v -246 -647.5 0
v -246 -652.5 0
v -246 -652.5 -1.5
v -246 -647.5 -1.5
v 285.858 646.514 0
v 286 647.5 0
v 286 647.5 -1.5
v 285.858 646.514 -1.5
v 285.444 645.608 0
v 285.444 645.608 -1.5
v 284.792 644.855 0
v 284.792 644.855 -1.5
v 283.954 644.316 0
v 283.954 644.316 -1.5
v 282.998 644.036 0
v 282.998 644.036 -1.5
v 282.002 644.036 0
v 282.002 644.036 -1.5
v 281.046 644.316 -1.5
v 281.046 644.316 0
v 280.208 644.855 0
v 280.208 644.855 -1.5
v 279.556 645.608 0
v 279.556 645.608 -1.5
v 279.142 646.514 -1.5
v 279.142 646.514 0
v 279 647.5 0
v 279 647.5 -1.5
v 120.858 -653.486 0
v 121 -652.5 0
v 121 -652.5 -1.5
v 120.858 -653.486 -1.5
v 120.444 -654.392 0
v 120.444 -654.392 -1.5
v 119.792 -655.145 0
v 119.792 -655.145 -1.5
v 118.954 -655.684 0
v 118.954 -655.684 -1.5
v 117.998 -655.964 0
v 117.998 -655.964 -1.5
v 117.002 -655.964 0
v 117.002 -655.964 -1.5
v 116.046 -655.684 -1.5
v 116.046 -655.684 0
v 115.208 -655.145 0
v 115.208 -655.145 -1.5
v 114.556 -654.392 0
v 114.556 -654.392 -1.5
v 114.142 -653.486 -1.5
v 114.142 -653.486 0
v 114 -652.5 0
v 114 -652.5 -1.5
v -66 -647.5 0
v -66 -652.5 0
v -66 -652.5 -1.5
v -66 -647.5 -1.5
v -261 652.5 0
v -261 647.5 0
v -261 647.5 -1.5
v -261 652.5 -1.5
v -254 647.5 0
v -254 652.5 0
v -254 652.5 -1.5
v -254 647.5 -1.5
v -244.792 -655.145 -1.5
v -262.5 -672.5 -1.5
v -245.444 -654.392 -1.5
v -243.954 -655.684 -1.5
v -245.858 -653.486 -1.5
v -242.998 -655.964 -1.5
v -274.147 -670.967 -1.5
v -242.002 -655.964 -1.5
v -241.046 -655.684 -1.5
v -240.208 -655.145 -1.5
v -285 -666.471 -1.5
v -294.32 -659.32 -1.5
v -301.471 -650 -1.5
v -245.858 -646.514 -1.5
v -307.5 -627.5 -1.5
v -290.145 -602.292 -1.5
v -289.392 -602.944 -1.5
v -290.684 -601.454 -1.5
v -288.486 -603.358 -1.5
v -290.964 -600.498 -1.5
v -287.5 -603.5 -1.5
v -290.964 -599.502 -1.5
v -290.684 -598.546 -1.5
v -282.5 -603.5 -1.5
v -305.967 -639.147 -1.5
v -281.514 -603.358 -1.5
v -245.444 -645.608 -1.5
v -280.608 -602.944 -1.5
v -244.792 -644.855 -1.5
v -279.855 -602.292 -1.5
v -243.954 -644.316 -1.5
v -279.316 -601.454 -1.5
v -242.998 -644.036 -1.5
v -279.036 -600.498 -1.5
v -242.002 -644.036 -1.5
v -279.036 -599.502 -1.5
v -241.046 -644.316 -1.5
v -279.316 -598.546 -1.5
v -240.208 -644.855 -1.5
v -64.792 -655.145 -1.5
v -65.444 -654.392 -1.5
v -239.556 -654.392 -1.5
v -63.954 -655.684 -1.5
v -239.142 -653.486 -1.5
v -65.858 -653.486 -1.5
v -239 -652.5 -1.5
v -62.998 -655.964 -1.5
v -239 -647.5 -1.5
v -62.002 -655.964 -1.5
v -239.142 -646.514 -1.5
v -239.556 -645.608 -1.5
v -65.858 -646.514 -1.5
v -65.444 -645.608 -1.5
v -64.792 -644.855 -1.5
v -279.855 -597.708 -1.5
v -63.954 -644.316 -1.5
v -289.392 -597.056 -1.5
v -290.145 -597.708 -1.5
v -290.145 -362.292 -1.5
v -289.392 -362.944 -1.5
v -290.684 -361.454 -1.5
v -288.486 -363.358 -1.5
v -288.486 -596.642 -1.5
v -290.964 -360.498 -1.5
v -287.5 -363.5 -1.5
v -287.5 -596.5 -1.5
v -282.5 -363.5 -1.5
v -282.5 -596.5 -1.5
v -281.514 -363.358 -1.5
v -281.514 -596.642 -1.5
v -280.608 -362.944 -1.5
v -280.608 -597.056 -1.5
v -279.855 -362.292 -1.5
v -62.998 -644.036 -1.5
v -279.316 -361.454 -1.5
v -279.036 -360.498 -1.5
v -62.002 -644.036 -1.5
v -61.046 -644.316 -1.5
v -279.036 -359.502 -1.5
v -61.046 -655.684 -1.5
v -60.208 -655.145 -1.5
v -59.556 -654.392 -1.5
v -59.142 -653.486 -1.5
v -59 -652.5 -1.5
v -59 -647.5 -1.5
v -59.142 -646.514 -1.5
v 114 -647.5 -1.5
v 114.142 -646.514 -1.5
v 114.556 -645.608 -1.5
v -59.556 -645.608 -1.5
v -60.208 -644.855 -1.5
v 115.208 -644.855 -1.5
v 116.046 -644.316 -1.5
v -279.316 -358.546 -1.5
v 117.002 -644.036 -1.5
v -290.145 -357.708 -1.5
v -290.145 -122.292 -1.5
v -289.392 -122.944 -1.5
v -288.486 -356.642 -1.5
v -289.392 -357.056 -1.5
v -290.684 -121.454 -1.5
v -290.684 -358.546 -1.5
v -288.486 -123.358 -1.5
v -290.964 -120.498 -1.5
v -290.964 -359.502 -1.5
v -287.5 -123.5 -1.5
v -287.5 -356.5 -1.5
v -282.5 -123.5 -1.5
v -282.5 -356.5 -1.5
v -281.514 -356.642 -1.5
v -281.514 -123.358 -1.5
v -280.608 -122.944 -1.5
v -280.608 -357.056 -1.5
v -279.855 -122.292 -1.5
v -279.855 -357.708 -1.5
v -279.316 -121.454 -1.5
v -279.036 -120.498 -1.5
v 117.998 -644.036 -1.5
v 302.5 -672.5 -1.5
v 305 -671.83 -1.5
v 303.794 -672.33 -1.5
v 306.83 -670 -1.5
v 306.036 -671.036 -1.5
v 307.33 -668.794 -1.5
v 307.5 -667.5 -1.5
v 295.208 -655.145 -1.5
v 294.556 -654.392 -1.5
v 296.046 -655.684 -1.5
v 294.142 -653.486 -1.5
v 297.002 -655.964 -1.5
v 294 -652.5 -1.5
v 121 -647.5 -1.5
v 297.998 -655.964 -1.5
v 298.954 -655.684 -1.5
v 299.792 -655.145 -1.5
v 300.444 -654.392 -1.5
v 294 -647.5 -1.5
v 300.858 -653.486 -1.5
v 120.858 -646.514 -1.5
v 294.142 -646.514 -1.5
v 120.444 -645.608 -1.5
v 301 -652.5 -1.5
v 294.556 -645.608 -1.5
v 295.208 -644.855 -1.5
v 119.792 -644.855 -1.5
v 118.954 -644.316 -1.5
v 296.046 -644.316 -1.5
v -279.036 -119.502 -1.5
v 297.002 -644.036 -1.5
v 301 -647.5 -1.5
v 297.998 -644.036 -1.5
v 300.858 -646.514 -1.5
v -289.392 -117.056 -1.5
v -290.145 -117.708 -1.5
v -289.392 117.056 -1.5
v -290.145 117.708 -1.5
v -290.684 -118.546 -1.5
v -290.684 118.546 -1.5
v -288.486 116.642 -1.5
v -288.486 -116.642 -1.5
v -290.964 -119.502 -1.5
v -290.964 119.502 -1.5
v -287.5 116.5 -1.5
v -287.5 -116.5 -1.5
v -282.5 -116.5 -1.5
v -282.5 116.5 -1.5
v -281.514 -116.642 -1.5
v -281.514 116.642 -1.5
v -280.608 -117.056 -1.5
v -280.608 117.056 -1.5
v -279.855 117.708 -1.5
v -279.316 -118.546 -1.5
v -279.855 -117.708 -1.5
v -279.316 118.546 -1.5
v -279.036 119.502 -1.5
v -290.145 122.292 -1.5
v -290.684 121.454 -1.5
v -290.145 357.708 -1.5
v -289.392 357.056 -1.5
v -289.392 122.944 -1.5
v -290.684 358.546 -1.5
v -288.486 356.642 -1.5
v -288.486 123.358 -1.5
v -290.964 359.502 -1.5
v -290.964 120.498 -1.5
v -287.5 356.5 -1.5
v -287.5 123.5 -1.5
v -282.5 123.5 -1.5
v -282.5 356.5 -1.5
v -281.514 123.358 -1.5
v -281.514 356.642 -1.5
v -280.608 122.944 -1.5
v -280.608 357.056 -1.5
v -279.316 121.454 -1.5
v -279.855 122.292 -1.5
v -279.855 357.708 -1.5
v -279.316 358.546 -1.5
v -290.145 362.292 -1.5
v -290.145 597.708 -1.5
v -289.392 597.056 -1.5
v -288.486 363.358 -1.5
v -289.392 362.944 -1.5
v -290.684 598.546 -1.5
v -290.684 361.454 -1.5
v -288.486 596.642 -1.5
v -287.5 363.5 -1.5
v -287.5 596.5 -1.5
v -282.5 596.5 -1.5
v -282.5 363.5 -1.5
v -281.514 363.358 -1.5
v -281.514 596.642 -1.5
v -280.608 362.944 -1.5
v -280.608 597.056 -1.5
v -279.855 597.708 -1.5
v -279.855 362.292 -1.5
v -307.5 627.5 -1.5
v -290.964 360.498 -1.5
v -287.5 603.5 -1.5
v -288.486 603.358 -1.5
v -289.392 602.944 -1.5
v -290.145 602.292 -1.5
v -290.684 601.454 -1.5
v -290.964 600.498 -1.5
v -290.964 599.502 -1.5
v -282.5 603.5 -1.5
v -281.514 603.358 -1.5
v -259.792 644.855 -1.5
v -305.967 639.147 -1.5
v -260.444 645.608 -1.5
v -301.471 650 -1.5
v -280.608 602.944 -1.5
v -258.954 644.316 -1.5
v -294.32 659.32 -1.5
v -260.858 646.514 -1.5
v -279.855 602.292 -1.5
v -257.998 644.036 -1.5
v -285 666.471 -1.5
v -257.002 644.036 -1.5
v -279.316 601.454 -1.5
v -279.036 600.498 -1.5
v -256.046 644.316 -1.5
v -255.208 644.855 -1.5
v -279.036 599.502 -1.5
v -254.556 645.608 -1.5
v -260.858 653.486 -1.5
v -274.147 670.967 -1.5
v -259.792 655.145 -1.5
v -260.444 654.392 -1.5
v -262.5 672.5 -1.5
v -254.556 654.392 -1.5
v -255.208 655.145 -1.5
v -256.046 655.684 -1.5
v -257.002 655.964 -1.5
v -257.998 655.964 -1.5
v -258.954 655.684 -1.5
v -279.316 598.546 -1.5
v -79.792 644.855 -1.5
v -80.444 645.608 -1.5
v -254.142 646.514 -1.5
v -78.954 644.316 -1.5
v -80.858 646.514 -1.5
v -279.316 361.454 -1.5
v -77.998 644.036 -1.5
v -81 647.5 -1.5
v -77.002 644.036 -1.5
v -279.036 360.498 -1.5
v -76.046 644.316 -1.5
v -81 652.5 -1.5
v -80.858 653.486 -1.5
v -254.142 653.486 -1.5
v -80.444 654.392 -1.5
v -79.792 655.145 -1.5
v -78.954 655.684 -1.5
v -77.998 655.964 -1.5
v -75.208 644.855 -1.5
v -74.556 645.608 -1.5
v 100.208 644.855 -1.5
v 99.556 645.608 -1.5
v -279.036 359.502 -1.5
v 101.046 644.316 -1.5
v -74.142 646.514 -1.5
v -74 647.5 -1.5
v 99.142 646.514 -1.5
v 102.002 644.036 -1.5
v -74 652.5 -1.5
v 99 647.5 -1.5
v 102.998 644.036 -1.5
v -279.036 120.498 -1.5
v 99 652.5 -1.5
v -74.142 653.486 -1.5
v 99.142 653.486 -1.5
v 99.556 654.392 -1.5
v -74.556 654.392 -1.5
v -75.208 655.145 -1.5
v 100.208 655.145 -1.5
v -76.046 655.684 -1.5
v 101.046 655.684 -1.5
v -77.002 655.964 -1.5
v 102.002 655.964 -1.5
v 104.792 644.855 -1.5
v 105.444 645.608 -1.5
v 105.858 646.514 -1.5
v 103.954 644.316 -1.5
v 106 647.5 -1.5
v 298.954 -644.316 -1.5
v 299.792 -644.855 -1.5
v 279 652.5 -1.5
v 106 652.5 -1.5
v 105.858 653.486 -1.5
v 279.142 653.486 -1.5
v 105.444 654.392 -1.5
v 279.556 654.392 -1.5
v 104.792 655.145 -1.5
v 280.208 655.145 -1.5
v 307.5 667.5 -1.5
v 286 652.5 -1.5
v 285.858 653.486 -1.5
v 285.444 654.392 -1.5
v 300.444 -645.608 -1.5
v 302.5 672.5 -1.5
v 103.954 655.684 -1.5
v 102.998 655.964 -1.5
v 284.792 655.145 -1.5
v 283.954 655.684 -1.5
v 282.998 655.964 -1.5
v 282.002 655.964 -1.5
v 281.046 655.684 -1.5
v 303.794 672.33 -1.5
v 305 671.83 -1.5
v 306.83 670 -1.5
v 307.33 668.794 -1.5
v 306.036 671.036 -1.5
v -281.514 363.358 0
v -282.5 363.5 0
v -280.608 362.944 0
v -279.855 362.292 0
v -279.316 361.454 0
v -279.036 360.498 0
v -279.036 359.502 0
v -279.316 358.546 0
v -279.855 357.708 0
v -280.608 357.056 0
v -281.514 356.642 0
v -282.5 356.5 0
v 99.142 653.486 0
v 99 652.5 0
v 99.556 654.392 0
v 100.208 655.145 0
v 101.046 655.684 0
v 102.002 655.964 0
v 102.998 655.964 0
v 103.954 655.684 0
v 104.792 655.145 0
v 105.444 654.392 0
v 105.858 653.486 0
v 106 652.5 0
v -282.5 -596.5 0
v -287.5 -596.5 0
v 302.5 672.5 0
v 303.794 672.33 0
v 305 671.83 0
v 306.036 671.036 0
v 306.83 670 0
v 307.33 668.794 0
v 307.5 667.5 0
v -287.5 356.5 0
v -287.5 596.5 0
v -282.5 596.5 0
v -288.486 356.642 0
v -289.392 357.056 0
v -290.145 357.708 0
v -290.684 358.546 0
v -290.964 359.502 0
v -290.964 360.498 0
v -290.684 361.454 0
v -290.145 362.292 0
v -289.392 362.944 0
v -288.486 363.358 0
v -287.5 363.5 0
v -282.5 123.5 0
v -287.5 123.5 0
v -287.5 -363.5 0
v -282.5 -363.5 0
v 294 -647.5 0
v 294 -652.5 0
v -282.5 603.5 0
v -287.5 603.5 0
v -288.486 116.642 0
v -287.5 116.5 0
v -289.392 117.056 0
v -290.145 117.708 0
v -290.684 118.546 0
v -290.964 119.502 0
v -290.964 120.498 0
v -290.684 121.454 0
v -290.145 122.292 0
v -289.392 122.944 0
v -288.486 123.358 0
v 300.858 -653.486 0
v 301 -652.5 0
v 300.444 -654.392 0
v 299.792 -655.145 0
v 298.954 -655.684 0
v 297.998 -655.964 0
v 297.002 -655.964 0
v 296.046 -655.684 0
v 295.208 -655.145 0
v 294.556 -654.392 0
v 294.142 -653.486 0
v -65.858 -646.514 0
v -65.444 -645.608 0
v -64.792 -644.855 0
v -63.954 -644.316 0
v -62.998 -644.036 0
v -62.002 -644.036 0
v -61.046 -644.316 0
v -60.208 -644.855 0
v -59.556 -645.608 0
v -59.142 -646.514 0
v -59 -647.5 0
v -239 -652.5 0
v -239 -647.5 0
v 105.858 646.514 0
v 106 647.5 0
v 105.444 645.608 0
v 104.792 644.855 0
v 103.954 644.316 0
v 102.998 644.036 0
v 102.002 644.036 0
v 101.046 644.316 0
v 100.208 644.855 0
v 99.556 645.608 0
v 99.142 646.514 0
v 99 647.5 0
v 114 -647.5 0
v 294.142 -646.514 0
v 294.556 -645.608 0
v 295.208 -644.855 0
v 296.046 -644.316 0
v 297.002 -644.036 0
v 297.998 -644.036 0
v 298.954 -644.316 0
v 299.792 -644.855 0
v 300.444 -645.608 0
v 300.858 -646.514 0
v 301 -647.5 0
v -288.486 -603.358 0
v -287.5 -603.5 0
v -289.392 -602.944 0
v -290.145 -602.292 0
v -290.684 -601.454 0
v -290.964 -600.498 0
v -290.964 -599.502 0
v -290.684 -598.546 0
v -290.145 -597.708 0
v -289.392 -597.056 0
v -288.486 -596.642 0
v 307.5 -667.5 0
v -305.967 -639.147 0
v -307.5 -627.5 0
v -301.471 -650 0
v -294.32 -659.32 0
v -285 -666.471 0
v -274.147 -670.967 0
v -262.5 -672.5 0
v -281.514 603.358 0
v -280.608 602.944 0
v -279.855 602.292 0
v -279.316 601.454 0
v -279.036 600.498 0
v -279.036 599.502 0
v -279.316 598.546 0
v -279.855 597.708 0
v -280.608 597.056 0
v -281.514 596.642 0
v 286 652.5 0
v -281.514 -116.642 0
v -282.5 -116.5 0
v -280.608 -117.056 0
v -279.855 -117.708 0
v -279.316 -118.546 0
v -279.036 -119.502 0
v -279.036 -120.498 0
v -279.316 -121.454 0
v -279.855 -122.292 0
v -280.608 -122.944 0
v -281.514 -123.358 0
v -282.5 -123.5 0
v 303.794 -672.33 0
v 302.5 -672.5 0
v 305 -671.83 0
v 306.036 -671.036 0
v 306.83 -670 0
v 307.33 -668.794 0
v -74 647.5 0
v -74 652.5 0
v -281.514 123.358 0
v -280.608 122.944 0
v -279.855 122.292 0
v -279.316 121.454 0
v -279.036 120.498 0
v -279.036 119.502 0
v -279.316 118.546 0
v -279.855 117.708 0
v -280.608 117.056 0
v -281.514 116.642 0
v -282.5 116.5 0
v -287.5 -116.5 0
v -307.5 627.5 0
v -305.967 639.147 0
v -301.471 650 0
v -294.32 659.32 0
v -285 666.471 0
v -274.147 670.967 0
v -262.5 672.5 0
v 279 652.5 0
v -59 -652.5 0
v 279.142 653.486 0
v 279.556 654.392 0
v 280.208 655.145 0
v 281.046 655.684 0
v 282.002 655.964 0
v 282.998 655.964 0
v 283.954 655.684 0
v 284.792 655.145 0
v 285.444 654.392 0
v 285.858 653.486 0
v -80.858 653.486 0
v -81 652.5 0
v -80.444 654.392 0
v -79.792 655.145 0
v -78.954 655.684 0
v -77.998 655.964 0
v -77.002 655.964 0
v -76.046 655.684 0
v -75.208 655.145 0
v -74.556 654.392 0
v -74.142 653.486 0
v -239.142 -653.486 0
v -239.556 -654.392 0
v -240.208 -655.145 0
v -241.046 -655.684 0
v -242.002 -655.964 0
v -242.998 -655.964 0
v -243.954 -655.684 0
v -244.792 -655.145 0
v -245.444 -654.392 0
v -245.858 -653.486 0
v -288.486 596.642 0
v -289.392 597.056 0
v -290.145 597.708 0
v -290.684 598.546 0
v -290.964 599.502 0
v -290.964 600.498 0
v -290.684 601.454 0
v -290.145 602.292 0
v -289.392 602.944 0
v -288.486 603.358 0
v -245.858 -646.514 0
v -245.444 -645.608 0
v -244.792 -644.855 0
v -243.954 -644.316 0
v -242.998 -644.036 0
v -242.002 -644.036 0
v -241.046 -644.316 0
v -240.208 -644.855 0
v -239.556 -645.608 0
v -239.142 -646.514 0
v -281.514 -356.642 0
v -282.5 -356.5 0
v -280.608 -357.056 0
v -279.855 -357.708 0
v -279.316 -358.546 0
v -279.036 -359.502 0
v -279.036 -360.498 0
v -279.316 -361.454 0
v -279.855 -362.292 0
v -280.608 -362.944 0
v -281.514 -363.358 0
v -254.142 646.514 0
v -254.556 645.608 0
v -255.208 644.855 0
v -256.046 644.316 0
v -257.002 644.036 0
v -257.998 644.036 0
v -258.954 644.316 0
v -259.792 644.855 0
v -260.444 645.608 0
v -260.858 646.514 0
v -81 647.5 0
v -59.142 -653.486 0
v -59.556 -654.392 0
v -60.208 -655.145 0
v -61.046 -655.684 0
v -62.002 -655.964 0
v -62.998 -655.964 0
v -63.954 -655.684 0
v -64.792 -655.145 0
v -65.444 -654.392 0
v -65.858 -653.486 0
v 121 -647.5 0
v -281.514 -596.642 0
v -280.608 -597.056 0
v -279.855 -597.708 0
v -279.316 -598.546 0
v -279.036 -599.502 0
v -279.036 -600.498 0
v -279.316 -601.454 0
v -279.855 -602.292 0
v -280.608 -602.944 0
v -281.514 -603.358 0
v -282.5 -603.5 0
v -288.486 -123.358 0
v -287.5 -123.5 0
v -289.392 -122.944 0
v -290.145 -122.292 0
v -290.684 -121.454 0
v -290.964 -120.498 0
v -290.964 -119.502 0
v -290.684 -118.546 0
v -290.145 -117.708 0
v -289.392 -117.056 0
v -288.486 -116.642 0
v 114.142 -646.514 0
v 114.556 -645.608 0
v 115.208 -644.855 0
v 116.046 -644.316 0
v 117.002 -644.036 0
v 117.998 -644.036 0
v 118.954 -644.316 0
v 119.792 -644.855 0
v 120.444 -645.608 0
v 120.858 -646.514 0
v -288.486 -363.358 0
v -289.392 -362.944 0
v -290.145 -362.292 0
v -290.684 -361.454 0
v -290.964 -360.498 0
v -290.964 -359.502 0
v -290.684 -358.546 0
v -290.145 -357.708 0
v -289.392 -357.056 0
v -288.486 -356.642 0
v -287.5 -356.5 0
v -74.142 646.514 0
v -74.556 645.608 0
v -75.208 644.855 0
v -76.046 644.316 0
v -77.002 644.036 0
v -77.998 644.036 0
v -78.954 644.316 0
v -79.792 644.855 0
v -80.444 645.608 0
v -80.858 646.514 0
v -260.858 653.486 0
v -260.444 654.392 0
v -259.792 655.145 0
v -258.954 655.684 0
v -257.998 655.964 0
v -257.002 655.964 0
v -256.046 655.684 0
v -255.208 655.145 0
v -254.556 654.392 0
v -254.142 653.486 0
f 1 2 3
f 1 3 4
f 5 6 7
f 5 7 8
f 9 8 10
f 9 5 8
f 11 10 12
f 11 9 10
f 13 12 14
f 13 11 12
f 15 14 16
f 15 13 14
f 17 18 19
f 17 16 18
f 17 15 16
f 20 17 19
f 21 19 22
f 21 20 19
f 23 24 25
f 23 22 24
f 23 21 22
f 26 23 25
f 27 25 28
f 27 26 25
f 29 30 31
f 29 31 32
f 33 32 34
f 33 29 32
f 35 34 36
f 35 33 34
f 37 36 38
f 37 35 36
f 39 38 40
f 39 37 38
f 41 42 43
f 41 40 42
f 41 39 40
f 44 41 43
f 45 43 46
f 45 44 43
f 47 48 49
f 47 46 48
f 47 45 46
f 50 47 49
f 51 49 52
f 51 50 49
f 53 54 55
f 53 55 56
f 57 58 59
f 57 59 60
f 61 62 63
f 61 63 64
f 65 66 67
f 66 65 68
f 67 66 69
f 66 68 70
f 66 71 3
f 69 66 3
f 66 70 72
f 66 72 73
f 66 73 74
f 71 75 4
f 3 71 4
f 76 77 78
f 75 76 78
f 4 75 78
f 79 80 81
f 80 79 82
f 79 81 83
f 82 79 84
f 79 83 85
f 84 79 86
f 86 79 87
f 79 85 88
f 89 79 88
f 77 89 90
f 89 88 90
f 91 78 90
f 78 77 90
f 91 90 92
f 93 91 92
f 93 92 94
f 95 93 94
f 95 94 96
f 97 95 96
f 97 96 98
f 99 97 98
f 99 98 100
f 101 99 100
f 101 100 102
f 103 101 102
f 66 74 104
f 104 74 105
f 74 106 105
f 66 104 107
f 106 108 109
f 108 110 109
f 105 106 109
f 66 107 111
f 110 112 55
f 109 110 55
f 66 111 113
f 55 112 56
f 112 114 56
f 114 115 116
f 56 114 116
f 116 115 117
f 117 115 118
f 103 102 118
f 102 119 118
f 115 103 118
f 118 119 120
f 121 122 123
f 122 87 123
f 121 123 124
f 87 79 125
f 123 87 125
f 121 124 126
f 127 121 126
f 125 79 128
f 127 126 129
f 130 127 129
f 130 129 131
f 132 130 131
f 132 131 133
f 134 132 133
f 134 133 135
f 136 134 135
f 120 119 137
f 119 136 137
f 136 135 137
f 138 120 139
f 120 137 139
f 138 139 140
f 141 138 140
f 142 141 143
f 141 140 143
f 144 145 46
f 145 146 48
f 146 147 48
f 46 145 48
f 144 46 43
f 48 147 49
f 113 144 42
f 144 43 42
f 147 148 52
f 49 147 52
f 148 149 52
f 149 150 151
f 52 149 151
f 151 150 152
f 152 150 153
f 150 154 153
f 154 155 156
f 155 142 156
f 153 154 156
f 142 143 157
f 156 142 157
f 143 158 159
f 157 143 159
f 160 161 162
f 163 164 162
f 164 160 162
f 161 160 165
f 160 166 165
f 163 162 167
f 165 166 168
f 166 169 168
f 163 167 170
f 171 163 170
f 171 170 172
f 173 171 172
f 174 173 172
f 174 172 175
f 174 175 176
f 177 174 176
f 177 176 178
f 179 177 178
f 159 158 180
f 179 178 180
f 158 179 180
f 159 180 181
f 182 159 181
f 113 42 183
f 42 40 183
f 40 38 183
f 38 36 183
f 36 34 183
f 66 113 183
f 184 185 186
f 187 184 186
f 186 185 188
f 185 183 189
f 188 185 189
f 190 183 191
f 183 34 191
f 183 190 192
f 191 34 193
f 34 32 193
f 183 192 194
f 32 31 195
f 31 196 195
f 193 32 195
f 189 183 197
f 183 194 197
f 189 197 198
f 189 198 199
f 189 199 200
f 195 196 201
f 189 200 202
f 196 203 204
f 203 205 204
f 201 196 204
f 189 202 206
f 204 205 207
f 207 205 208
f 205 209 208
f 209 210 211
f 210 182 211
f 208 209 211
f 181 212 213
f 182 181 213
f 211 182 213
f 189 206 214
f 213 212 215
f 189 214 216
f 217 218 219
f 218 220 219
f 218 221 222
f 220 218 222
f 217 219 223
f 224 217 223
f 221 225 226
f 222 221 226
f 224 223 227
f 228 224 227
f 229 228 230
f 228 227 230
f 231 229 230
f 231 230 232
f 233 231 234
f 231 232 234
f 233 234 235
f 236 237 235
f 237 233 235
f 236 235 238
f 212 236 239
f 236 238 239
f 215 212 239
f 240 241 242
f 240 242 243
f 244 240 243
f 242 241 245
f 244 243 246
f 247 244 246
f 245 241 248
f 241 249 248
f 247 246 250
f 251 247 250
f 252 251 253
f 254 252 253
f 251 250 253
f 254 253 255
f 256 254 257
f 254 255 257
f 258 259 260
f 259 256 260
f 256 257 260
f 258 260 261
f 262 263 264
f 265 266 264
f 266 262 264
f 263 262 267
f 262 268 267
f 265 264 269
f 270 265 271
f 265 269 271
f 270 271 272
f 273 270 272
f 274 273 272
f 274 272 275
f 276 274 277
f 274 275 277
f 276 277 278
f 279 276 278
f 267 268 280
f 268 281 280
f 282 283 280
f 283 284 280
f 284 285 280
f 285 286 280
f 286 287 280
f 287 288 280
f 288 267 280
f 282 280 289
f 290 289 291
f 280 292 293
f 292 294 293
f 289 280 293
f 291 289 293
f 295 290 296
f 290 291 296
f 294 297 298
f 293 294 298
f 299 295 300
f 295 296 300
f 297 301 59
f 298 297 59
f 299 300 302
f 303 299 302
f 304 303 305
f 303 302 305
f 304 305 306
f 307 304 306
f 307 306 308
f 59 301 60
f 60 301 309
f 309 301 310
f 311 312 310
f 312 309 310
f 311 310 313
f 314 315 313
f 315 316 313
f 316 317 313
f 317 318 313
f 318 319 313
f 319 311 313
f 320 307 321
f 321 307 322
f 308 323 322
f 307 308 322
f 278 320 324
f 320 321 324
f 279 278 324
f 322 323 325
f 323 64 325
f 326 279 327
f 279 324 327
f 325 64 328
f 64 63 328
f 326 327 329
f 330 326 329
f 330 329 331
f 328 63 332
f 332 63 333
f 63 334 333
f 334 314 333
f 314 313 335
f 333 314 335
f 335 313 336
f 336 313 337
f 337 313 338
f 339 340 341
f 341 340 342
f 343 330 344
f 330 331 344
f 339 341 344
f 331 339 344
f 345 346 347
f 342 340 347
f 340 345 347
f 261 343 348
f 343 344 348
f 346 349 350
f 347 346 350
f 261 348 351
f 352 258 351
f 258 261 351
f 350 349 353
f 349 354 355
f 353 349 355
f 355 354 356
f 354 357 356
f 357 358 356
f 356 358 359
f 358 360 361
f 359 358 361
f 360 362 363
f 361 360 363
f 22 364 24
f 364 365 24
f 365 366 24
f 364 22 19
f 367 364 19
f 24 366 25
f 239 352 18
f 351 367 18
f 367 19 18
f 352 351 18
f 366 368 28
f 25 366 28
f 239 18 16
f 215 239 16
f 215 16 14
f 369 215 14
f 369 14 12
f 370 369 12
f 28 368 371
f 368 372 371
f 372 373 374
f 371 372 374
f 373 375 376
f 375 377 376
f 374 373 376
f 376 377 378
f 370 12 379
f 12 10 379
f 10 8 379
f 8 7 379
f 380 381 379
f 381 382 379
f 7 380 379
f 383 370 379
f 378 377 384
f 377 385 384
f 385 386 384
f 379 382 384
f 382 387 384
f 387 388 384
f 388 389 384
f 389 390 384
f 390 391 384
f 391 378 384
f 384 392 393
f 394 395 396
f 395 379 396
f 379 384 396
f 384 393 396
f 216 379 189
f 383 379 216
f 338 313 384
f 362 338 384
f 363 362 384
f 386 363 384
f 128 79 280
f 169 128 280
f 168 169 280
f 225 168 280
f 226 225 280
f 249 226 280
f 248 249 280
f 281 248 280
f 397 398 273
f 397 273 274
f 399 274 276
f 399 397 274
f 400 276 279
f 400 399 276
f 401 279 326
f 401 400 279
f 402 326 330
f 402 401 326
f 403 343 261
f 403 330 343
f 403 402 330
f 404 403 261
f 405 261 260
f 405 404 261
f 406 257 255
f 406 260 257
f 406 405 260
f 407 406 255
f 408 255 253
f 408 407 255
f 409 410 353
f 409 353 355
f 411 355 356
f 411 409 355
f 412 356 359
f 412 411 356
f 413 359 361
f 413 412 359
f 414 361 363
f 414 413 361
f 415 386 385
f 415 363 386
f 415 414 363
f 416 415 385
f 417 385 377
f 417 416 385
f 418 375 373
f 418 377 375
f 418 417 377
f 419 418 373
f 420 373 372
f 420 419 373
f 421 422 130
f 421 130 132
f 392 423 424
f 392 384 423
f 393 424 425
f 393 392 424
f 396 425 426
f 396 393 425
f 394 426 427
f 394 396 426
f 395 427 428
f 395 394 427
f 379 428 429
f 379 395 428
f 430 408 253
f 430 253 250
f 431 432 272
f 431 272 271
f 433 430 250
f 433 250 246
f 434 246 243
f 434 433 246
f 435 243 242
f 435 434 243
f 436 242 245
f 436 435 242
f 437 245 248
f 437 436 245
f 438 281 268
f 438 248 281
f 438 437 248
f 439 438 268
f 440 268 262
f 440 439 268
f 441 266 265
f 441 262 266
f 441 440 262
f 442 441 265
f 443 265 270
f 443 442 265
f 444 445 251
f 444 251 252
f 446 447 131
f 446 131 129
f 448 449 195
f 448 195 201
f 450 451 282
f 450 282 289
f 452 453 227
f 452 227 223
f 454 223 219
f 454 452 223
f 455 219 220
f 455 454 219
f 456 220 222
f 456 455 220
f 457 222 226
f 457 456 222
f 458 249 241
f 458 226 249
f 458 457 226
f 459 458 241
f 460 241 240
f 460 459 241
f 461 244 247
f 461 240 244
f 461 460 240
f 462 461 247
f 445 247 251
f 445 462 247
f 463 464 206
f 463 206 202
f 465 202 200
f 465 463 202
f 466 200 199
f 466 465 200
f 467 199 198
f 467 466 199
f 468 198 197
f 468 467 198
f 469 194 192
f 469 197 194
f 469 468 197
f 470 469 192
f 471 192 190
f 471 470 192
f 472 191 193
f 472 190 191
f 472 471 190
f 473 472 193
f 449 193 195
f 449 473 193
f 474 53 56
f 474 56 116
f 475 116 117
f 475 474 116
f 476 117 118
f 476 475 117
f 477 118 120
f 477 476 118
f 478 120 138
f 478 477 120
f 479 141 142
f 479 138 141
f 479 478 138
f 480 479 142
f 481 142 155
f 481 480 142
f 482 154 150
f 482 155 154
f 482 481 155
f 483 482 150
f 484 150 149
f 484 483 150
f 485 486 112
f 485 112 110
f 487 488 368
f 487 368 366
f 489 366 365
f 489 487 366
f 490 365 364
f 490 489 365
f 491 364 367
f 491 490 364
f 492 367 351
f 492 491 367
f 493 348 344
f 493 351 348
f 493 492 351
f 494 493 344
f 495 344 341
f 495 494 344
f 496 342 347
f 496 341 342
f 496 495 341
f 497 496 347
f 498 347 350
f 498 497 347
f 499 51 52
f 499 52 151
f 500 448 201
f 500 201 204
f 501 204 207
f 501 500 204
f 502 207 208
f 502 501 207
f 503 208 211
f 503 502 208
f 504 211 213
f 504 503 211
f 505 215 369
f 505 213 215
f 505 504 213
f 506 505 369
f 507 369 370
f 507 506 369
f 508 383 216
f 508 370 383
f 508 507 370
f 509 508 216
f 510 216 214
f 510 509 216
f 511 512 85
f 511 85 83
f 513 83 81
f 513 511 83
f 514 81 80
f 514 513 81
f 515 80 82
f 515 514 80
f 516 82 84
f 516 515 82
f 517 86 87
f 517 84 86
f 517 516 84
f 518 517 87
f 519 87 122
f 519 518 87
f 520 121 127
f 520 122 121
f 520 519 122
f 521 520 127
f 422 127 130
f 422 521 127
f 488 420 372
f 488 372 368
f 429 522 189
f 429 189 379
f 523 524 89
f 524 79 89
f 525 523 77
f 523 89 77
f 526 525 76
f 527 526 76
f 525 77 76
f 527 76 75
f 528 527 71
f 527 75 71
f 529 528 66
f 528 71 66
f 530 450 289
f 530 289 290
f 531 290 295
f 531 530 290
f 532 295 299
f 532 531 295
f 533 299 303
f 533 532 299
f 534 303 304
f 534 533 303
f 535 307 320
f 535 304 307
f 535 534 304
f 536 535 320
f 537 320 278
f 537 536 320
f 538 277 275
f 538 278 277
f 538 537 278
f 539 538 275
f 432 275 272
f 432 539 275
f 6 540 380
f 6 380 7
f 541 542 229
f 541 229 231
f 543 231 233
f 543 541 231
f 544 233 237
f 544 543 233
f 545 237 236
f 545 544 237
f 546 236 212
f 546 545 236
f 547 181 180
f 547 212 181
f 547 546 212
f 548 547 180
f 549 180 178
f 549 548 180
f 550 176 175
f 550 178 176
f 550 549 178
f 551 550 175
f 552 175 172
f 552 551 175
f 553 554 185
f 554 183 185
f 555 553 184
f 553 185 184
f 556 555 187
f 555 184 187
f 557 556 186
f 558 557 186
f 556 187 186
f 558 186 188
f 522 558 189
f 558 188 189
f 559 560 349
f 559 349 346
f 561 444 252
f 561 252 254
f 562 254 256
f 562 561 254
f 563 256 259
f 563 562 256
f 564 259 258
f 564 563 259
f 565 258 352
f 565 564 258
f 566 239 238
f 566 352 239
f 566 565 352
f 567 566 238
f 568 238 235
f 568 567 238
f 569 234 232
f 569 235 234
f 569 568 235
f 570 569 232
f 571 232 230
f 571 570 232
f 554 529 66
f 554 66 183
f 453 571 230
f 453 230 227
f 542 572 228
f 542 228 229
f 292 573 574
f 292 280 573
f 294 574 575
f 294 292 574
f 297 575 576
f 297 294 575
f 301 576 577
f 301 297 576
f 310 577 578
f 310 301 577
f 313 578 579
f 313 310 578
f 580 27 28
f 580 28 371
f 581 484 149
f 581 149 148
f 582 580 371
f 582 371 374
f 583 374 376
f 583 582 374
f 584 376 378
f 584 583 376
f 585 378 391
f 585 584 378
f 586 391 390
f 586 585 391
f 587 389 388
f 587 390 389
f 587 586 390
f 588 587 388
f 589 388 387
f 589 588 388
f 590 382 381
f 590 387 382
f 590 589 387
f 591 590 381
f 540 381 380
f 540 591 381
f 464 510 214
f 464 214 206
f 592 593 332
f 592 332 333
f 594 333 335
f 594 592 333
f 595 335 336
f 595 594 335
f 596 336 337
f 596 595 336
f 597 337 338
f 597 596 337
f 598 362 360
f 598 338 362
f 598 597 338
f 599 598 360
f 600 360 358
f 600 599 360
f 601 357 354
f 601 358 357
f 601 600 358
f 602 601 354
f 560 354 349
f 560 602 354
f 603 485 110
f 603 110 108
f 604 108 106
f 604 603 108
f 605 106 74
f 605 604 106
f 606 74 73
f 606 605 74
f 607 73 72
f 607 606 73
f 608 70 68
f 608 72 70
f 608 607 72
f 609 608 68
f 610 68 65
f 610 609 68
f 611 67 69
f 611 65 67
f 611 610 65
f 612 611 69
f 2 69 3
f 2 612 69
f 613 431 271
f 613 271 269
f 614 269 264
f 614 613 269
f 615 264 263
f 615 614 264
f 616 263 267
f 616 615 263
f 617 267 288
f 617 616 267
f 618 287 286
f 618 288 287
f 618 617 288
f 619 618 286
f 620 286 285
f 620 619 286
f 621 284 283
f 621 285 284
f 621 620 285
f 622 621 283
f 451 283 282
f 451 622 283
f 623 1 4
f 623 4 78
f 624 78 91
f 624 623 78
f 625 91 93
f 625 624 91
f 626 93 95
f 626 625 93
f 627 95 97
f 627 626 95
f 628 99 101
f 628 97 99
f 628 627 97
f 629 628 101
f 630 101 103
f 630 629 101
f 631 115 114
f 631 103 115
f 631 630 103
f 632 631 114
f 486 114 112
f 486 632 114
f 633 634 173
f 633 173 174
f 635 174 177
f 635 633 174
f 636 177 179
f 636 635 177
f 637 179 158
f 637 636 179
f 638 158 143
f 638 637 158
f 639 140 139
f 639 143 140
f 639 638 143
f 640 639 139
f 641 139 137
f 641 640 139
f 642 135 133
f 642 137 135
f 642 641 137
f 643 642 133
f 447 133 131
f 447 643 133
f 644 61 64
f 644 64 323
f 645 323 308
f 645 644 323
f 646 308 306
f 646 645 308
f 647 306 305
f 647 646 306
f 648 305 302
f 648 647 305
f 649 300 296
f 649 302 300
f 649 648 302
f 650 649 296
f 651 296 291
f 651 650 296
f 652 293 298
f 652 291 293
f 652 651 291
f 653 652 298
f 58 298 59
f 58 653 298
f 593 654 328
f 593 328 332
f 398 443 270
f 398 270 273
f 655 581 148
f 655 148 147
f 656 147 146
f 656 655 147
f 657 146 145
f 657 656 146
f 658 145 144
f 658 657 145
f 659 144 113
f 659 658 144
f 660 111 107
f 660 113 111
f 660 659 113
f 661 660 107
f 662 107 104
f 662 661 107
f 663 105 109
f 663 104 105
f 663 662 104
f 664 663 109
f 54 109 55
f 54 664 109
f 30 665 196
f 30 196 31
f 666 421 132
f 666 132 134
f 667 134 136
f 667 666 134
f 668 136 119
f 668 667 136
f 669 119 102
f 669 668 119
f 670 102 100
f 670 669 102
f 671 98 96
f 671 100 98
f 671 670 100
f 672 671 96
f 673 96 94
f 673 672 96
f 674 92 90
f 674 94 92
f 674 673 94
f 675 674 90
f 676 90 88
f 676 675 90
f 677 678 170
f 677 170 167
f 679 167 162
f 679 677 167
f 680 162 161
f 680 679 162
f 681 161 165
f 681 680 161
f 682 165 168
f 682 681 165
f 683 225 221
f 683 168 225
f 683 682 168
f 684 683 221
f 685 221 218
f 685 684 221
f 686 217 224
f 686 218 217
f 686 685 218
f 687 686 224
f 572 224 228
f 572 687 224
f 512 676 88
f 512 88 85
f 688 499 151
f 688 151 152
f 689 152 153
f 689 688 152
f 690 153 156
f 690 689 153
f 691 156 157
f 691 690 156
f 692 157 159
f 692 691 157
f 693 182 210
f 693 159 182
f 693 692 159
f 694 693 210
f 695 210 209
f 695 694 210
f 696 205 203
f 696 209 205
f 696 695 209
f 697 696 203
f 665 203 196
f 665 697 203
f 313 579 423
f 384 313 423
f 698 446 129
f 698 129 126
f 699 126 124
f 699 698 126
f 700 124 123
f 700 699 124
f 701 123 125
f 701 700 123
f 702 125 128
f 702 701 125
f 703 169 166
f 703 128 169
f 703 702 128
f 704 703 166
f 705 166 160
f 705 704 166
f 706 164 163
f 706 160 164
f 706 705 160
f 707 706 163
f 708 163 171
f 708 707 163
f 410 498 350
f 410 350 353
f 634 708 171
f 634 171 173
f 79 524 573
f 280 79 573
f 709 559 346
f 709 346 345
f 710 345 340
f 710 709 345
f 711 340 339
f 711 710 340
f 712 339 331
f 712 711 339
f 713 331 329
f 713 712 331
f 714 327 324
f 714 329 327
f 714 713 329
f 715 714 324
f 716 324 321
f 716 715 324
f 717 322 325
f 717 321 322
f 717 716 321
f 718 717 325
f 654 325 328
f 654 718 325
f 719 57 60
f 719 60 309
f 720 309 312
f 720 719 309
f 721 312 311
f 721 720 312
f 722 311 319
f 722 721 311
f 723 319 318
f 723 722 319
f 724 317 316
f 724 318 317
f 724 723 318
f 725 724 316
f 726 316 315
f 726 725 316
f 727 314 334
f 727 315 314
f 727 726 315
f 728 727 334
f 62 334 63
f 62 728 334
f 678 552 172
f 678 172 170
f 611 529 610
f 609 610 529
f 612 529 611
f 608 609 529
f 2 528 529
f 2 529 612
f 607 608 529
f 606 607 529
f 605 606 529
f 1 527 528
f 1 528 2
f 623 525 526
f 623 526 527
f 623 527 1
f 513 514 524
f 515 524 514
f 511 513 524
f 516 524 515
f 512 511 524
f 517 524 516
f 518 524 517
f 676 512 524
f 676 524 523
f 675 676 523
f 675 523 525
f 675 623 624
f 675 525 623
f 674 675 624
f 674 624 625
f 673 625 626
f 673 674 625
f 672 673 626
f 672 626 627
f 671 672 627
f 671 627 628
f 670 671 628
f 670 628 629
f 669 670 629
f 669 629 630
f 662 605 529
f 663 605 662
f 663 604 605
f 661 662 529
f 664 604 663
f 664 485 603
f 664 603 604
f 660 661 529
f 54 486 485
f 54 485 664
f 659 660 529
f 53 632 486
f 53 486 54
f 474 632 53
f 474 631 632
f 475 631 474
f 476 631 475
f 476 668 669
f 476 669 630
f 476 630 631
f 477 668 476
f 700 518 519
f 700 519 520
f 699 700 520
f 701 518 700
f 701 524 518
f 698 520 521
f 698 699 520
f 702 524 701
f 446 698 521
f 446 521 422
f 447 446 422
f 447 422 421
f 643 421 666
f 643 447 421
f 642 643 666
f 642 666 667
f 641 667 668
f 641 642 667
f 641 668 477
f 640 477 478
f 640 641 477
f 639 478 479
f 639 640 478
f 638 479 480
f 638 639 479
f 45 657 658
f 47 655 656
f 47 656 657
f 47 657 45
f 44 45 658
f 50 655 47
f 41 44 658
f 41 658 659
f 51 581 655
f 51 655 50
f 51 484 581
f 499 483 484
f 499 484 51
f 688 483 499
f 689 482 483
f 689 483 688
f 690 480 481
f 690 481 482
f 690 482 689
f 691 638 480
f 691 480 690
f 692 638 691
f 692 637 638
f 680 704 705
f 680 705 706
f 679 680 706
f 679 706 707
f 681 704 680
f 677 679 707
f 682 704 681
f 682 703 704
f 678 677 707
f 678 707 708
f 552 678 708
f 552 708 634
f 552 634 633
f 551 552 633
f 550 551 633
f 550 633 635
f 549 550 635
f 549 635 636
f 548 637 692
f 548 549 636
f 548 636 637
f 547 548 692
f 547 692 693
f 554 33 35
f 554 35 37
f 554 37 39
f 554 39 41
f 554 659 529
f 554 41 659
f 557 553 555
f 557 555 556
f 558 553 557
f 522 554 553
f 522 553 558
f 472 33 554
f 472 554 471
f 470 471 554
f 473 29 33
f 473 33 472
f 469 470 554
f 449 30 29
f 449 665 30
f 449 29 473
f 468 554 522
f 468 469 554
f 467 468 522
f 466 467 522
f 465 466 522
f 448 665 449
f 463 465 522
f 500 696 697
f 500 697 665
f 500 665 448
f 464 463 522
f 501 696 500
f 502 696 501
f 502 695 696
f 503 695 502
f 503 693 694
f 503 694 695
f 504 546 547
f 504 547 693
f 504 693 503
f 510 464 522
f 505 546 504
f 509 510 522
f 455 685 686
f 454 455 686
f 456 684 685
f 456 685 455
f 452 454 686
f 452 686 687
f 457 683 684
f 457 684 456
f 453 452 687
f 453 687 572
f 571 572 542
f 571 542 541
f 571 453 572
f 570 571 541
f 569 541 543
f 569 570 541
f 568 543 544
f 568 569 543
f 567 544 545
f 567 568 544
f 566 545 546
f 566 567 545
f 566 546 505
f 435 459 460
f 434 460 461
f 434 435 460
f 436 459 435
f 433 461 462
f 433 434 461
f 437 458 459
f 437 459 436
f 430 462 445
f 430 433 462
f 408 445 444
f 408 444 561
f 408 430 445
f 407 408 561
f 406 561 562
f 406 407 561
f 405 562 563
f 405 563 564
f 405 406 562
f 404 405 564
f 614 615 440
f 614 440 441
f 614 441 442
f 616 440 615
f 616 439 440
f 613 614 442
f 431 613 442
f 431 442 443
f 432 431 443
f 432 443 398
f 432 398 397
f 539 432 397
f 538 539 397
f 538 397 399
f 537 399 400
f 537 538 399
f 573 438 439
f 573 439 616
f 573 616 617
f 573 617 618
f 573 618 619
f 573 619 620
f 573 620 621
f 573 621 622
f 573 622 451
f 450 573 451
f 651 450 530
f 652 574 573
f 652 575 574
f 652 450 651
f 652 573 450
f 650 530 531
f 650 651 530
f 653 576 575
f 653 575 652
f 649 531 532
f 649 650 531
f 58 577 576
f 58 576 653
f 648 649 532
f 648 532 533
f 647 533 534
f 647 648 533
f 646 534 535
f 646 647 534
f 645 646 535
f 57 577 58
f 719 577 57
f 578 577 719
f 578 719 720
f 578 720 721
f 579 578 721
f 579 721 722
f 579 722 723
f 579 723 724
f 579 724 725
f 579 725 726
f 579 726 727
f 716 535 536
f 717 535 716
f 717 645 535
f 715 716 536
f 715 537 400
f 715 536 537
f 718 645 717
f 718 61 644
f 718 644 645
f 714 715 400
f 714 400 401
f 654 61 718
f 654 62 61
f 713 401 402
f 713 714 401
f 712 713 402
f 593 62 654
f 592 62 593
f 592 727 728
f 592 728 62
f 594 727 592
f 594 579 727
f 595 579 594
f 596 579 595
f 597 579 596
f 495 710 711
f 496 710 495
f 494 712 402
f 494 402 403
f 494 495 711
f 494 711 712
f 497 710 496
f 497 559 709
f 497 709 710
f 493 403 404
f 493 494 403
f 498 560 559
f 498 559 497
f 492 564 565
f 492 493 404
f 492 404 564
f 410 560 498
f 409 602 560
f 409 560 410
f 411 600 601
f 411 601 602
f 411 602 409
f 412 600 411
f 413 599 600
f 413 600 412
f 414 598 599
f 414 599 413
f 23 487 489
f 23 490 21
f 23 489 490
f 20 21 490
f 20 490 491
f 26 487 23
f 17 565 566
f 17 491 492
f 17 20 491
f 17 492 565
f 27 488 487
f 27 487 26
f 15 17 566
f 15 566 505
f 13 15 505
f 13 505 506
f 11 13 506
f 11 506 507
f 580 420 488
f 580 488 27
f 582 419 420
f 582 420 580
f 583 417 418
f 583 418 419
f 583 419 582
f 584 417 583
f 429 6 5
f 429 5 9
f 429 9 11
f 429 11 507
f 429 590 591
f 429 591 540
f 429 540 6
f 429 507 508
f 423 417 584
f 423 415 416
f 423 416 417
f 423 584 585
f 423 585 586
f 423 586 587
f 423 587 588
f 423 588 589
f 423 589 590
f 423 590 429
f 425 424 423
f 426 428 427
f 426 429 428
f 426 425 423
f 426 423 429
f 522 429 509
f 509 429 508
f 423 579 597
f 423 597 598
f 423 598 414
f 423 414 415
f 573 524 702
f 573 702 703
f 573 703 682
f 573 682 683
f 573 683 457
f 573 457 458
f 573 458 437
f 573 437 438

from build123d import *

# Parameters (mm, degrees)
SKETCH_1_W             = 615
SKETCH_1_H             = 1345
SM_BASE_FLANGE_1_DEPTH = 1.5
FILLET_1_R             = 45
FILLET_2_R             = 5
CUT_EXTRUDE_2_DEPTH    = 10
PATTERN_LINEAR_1_COUNT = 6
PATTERN_LINEAR_1_PITCH = 240
CUT_EXTRUDE_3_DEPTH    = 10
PATTERN_LINEAR_2_COUNT = 4
PATTERN_LINEAR_2_PITCH = 180


# Sheet-metal steps are written as plain solids
with BuildPart() as part:
    # Sketch 1 → 基体-法兰1 (new body)
    with BuildSketch(Plane.XY):
        Rectangle(SKETCH_1_W, SKETCH_1_H)
    extrude(amount=-SM_BASE_FLANGE_1_DEPTH)

    # 圆角1
    fillet_1_edges = [part.edges().sort_by_distance(p)[0] for p in [
        (-307.5, 672.5, -0.75),
        (-307.5, -672.5, -0.75),
    ]]
    fillet(fillet_1_edges, radius=FILLET_1_R)

    # 圆角2
    fillet_2_edges = [part.edges().sort_by_distance(p)[0] for p in [
        (307.5, 672.5, -0.75),
        (307.5, -672.5, -0.75),
    ]]
    fillet(fillet_2_edges, radius=FILLET_2_R)

    # 草图3 → 切除-拉伸2 (cut)
    with BuildSketch(Plane.XY):
        with BuildLine():
            Line((-287.5, -596.5), (-282.5, -596.5))
            ThreePointArc((-282.5, -596.5), (-279, -600), (-282.5, -603.5))
            Line((-282.5, -603.5), (-287.5, -603.5))
            ThreePointArc((-287.5, -603.5), (-291, -600), (-287.5, -596.5))
        make_face()
    cut_extrude_2 = extrude(amount=-CUT_EXTRUDE_2_DEPTH, mode=Mode.SUBTRACT)

    # 阵列(线性)1: 切除-拉伸2 ×6
    with Locations(*[(0, i * PATTERN_LINEAR_1_PITCH, 0) for i in range(1, PATTERN_LINEAR_1_COUNT)]):
        add(cut_extrude_2, mode=Mode.SUBTRACT)

    # 草图4 → 切除-拉伸3 (cut)
    with BuildSketch(Plane.XY):
        with BuildLine():
            Line((-261, 647.5), (-261, 652.5))
            ThreePointArc((-261, 652.5), (-257.5, 656), (-254, 652.5))
            Line((-254, 652.5), (-254, 647.5))
            ThreePointArc((-254, 647.5), (-257.5, 644), (-261, 647.5))
        make_face()
        with BuildLine():
            Line((-246, -652.5), (-246, -647.5))
            ThreePointArc((-246, -647.5), (-242.5, -644), (-239, -647.5))
            Line((-239, -647.5), (-239, -652.5))
            ThreePointArc((-239, -652.5), (-242.5, -656), (-246, -652.5))
        make_face()
    cut_extrude_3 = extrude(amount=-CUT_EXTRUDE_3_DEPTH, mode=Mode.SUBTRACT)

    # 阵列(线性)2: 切除-拉伸3 ×4
    with Locations(*[(i * PATTERN_LINEAR_2_PITCH, 0, 0) for i in range(1, PATTERN_LINEAR_2_COUNT)]):
        add(cut_extrude_3, mode=Mode.SUBTRACT)


solid = part.part
